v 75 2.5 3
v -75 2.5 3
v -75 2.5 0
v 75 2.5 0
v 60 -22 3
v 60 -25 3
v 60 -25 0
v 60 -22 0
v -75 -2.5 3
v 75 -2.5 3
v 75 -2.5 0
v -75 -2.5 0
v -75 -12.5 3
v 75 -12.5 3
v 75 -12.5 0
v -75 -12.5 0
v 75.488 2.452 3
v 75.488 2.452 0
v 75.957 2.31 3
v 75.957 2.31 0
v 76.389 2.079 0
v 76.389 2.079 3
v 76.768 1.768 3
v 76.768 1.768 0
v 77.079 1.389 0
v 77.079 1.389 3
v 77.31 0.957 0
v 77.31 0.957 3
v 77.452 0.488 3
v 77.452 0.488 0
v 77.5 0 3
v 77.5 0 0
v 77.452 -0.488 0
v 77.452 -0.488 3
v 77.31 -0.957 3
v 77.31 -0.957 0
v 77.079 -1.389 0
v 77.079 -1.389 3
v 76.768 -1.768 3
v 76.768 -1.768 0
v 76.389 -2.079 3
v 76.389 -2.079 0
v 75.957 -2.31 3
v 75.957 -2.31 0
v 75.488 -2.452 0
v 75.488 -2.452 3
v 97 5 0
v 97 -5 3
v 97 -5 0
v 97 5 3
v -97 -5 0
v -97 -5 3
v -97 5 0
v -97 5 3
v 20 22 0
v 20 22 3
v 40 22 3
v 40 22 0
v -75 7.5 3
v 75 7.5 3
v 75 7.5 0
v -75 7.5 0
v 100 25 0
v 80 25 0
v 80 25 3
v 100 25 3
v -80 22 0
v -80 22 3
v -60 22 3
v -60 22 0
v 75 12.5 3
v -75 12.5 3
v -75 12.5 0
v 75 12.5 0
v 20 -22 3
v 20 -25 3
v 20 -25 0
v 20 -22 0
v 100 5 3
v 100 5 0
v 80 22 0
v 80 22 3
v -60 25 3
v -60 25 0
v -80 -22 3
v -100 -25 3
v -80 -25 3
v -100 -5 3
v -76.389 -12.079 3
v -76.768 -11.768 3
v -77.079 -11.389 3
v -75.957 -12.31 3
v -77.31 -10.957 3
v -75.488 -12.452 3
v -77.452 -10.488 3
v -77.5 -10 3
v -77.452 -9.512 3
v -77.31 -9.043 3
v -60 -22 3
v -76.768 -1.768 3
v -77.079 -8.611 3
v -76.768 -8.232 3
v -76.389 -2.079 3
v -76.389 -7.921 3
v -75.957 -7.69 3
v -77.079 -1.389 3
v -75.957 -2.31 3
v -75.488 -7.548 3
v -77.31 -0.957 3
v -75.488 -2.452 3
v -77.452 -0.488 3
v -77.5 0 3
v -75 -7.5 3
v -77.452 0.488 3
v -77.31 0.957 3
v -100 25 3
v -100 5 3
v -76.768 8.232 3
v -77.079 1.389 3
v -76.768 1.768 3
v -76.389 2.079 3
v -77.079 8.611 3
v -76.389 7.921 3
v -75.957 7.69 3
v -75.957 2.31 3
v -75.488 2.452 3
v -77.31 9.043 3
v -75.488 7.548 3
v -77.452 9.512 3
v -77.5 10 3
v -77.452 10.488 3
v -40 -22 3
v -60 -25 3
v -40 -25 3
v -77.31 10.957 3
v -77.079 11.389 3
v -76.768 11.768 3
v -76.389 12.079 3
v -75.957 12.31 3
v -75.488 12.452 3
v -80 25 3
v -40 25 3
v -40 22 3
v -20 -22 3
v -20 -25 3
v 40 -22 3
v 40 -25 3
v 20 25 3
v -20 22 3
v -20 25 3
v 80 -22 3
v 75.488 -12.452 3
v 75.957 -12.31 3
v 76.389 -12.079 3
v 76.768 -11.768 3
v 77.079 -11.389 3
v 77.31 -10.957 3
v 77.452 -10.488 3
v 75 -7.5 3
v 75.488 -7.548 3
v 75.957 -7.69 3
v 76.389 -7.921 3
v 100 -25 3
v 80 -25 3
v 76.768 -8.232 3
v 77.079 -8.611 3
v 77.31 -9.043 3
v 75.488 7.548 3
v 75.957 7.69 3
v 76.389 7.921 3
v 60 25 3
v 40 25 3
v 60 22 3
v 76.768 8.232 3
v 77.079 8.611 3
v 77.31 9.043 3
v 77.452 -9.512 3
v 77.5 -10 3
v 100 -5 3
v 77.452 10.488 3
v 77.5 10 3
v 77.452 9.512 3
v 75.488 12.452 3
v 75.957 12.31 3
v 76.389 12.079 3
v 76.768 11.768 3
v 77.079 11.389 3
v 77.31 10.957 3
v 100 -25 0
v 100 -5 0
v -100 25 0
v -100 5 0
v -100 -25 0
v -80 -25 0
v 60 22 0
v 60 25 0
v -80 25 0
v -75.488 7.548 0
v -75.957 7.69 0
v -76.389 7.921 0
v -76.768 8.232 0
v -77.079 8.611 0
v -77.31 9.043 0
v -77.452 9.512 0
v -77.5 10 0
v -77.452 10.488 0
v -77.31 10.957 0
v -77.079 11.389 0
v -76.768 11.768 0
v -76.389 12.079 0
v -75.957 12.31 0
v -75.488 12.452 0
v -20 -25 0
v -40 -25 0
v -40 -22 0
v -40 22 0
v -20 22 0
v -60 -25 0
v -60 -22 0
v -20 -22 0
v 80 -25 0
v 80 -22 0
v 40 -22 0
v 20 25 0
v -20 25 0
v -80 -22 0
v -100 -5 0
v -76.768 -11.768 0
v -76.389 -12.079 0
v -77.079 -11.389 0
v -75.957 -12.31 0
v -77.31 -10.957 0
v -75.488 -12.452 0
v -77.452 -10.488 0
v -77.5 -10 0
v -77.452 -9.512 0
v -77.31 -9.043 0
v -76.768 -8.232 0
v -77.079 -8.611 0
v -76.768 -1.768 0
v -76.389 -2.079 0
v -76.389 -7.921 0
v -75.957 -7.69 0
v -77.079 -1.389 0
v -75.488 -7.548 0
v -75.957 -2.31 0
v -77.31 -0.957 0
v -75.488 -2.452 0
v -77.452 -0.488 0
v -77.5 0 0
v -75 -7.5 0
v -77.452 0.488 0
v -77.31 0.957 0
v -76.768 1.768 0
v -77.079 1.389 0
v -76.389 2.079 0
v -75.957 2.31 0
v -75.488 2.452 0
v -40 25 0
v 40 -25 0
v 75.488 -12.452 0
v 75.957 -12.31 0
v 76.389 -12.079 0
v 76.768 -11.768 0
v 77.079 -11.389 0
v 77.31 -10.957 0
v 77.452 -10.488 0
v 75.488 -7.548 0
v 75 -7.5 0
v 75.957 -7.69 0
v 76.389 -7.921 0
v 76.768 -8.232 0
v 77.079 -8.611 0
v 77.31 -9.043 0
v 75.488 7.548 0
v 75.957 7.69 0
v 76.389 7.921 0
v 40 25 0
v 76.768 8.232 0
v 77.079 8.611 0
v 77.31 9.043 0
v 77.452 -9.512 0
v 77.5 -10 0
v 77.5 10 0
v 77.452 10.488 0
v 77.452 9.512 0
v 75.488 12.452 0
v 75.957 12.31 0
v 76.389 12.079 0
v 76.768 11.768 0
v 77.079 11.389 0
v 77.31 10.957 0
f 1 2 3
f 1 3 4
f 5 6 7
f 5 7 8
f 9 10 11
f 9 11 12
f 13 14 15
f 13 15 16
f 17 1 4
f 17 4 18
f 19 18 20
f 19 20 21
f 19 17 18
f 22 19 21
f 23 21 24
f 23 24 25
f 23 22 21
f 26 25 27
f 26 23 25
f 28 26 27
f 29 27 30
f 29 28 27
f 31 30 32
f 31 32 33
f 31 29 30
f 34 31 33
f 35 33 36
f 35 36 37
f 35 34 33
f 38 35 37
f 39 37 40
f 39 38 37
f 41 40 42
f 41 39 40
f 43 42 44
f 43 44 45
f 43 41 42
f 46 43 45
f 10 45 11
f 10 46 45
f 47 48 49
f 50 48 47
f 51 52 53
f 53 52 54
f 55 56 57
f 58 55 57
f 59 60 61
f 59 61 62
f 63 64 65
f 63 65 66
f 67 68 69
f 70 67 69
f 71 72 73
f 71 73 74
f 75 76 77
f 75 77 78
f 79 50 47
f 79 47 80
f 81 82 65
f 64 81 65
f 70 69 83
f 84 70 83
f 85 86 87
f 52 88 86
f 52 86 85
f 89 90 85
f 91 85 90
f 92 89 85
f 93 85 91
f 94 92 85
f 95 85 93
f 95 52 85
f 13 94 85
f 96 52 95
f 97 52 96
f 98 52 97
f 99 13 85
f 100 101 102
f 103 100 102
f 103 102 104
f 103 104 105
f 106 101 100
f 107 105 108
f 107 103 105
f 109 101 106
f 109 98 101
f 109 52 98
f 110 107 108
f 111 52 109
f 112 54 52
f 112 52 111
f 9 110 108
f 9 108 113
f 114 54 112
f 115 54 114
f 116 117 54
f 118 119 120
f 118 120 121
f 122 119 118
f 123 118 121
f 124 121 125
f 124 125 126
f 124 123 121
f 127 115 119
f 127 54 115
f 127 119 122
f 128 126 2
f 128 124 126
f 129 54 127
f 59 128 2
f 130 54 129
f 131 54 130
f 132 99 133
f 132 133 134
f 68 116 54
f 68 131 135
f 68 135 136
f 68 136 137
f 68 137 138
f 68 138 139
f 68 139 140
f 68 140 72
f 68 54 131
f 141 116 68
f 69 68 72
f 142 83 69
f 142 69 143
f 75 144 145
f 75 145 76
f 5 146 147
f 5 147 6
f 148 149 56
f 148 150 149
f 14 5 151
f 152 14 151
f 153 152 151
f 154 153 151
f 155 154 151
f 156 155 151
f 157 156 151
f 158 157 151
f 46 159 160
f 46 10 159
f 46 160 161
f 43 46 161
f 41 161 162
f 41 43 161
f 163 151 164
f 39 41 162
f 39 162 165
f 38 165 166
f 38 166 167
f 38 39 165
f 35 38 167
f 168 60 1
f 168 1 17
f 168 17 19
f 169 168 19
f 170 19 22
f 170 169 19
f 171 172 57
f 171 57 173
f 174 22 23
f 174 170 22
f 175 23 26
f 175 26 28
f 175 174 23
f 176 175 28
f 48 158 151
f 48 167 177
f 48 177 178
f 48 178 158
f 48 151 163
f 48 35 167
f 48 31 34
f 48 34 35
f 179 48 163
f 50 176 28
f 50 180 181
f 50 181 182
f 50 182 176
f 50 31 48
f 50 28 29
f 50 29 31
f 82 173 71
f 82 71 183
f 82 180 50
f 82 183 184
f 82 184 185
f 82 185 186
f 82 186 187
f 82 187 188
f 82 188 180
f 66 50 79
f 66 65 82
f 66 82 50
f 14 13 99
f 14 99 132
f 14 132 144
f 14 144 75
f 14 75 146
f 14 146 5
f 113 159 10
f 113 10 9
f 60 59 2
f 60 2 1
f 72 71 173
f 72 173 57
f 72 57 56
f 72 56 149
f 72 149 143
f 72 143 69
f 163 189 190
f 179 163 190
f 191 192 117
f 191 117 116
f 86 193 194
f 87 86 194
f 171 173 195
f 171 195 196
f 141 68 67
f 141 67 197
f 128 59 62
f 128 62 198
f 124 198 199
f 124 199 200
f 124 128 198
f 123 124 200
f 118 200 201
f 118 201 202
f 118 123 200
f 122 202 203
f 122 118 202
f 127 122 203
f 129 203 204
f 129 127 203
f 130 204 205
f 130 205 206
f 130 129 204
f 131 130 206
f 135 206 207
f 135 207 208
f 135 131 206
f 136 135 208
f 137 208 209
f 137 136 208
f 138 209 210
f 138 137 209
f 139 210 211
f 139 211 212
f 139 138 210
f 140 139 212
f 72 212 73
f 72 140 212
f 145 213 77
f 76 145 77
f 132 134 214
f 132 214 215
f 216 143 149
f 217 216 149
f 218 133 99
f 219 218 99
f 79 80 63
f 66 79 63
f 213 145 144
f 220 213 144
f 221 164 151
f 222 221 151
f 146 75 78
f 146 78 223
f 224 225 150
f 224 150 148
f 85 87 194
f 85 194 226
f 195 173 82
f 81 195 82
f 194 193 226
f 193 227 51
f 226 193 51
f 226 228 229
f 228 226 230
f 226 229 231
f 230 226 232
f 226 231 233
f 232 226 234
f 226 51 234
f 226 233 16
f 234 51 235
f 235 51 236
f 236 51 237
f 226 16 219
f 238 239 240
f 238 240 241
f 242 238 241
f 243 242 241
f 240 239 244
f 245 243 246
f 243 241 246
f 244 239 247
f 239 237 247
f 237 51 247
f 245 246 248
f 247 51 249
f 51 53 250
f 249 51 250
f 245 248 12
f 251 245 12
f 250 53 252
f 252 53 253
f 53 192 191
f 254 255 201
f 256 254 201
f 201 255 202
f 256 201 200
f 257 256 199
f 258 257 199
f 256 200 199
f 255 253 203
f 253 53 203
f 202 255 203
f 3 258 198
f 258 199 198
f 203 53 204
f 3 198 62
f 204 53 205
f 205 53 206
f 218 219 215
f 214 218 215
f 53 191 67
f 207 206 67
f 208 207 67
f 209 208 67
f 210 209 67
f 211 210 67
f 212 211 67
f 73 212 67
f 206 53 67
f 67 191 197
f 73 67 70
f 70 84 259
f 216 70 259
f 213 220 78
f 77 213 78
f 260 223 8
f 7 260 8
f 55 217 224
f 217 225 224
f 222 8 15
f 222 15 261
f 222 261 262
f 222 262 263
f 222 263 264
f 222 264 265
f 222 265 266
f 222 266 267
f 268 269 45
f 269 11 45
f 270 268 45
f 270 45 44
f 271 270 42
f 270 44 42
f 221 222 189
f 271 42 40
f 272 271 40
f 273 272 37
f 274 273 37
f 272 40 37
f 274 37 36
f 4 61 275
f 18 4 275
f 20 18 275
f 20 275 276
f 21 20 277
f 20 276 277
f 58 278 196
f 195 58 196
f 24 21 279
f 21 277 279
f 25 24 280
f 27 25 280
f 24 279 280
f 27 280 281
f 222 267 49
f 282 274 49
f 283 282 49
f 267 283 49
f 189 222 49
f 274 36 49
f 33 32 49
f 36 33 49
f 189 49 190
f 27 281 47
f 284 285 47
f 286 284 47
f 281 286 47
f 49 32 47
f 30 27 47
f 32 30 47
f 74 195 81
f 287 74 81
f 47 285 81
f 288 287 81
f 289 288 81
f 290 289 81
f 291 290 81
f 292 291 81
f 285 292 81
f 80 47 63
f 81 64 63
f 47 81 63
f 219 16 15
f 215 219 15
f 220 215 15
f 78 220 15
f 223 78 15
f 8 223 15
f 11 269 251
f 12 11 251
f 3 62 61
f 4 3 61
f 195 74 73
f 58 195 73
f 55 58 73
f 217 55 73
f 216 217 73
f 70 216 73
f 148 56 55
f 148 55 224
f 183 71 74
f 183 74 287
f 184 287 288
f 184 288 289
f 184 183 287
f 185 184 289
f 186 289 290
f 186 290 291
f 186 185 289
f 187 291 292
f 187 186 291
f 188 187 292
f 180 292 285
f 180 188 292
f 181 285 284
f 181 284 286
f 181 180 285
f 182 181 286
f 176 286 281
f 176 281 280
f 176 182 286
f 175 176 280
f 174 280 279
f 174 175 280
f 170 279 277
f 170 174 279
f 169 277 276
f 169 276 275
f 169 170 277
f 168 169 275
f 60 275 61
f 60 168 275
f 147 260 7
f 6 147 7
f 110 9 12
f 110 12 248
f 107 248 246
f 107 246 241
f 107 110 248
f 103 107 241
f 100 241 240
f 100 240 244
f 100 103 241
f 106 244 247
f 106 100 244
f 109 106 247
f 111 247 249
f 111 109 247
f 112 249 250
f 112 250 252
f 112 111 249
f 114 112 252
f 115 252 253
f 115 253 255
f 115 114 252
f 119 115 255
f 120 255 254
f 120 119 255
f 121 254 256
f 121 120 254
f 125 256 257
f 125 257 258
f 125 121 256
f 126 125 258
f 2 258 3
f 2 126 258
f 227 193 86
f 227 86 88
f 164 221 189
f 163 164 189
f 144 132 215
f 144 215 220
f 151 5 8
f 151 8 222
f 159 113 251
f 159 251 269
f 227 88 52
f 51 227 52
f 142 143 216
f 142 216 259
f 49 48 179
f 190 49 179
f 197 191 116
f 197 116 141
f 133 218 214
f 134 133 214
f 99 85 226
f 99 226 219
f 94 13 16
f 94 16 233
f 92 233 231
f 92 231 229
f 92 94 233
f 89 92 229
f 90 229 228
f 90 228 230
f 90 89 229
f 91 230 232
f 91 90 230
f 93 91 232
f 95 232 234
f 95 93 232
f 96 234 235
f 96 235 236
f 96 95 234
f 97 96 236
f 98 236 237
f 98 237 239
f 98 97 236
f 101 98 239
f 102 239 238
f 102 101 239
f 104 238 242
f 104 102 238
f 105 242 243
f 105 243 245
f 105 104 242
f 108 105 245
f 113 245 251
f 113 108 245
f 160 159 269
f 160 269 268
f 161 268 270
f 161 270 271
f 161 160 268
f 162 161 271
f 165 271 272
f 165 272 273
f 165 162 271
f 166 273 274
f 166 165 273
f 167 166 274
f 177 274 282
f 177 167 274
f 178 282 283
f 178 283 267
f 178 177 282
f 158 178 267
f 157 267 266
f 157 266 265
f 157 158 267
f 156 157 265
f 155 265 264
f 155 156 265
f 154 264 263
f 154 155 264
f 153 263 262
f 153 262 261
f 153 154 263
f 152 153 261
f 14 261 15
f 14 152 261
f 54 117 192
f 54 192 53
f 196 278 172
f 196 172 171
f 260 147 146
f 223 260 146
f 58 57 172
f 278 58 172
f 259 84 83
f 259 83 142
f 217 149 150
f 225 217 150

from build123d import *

# Parameters (mm, degrees)
SKETCH1_W           = 200
SKETCH1_H           = 50
BOSS_EXTRUDE1_DEPTH = 3
SKETCH2_W           = 20
SKETCH2_H           = 3
SKETCH2_W_2         = 3
SKETCH2_H_2         = 10
CUT_EXTRUDE1_DEPTH  = 3
CUT_EXTRUDE2_DEPTH  = 3


with BuildPart() as part:
    # Sketch1 → Boss-Extrude1 (new body)
    with BuildSketch(Plane.XY):
        Rectangle(SKETCH1_W, SKETCH1_H)
    extrude(amount=BOSS_EXTRUDE1_DEPTH)

    # Sketch2 → Cut-Extrude1 (cut)
    with BuildSketch(Plane.XY.offset(3)):
        with Locations((-70, 23.5)):
            Rectangle(SKETCH2_W, SKETCH2_H)
        with Locations((-30, -23.5)):
            Rectangle(SKETCH2_W, SKETCH2_H)
        with Locations((98.5, 0)):
            Rectangle(SKETCH2_W_2, SKETCH2_H_2)
        with Locations((-70, -23.5)):
            Rectangle(SKETCH2_W, SKETCH2_H)
        with Locations((30, 23.5)):
            Rectangle(SKETCH2_W, SKETCH2_H)
        with Locations((70, 23.5)):
            Rectangle(SKETCH2_W, SKETCH2_H)
        with Locations((-30, 23.5)):
            Rectangle(SKETCH2_W, SKETCH2_H)
        with Locations((30, -23.5)):
            Rectangle(SKETCH2_W, SKETCH2_H)
        with Locations((70, -23.5)):
            Rectangle(SKETCH2_W, SKETCH2_H)
        with Locations((-98.5, 0)):
            Rectangle(SKETCH2_W_2, SKETCH2_H_2)
    extrude(amount=-CUT_EXTRUDE1_DEPTH, mode=Mode.SUBTRACT)

    # Sketch3 → Cut-Extrude2 (cut)
    with BuildSketch(Plane.XY.offset(3)):
        with BuildLine():
            Line((75, 7.5), (-75, 7.5))
            ThreePointArc((-75, 7.5), (-77.5, 10), (-75, 12.5))
            Line((-75, 12.5), (75, 12.5))
            ThreePointArc((75, 12.5), (77.5, 10), (75, 7.5))
        make_face()
        with BuildLine():
            Line((75, -2.5), (-75, -2.5))
            ThreePointArc((-75, -2.5), (-77.5, 0), (-75, 2.5))
            Line((-75, 2.5), (75, 2.5))
            ThreePointArc((75, 2.5), (77.5, 0), (75, -2.5))
        make_face()
        with BuildLine():
            Line((75, -12.5), (-75, -12.5))
            ThreePointArc((-75, -12.5), (-77.5, -10), (-75, -7.5))
            Line((-75, -7.5), (75, -7.5))
            ThreePointArc((75, -7.5), (77.5, -10), (75, -12.5))
        make_face()
    extrude(amount=-CUT_EXTRUDE2_DEPTH, mode=Mode.SUBTRACT)


solid = part.part
